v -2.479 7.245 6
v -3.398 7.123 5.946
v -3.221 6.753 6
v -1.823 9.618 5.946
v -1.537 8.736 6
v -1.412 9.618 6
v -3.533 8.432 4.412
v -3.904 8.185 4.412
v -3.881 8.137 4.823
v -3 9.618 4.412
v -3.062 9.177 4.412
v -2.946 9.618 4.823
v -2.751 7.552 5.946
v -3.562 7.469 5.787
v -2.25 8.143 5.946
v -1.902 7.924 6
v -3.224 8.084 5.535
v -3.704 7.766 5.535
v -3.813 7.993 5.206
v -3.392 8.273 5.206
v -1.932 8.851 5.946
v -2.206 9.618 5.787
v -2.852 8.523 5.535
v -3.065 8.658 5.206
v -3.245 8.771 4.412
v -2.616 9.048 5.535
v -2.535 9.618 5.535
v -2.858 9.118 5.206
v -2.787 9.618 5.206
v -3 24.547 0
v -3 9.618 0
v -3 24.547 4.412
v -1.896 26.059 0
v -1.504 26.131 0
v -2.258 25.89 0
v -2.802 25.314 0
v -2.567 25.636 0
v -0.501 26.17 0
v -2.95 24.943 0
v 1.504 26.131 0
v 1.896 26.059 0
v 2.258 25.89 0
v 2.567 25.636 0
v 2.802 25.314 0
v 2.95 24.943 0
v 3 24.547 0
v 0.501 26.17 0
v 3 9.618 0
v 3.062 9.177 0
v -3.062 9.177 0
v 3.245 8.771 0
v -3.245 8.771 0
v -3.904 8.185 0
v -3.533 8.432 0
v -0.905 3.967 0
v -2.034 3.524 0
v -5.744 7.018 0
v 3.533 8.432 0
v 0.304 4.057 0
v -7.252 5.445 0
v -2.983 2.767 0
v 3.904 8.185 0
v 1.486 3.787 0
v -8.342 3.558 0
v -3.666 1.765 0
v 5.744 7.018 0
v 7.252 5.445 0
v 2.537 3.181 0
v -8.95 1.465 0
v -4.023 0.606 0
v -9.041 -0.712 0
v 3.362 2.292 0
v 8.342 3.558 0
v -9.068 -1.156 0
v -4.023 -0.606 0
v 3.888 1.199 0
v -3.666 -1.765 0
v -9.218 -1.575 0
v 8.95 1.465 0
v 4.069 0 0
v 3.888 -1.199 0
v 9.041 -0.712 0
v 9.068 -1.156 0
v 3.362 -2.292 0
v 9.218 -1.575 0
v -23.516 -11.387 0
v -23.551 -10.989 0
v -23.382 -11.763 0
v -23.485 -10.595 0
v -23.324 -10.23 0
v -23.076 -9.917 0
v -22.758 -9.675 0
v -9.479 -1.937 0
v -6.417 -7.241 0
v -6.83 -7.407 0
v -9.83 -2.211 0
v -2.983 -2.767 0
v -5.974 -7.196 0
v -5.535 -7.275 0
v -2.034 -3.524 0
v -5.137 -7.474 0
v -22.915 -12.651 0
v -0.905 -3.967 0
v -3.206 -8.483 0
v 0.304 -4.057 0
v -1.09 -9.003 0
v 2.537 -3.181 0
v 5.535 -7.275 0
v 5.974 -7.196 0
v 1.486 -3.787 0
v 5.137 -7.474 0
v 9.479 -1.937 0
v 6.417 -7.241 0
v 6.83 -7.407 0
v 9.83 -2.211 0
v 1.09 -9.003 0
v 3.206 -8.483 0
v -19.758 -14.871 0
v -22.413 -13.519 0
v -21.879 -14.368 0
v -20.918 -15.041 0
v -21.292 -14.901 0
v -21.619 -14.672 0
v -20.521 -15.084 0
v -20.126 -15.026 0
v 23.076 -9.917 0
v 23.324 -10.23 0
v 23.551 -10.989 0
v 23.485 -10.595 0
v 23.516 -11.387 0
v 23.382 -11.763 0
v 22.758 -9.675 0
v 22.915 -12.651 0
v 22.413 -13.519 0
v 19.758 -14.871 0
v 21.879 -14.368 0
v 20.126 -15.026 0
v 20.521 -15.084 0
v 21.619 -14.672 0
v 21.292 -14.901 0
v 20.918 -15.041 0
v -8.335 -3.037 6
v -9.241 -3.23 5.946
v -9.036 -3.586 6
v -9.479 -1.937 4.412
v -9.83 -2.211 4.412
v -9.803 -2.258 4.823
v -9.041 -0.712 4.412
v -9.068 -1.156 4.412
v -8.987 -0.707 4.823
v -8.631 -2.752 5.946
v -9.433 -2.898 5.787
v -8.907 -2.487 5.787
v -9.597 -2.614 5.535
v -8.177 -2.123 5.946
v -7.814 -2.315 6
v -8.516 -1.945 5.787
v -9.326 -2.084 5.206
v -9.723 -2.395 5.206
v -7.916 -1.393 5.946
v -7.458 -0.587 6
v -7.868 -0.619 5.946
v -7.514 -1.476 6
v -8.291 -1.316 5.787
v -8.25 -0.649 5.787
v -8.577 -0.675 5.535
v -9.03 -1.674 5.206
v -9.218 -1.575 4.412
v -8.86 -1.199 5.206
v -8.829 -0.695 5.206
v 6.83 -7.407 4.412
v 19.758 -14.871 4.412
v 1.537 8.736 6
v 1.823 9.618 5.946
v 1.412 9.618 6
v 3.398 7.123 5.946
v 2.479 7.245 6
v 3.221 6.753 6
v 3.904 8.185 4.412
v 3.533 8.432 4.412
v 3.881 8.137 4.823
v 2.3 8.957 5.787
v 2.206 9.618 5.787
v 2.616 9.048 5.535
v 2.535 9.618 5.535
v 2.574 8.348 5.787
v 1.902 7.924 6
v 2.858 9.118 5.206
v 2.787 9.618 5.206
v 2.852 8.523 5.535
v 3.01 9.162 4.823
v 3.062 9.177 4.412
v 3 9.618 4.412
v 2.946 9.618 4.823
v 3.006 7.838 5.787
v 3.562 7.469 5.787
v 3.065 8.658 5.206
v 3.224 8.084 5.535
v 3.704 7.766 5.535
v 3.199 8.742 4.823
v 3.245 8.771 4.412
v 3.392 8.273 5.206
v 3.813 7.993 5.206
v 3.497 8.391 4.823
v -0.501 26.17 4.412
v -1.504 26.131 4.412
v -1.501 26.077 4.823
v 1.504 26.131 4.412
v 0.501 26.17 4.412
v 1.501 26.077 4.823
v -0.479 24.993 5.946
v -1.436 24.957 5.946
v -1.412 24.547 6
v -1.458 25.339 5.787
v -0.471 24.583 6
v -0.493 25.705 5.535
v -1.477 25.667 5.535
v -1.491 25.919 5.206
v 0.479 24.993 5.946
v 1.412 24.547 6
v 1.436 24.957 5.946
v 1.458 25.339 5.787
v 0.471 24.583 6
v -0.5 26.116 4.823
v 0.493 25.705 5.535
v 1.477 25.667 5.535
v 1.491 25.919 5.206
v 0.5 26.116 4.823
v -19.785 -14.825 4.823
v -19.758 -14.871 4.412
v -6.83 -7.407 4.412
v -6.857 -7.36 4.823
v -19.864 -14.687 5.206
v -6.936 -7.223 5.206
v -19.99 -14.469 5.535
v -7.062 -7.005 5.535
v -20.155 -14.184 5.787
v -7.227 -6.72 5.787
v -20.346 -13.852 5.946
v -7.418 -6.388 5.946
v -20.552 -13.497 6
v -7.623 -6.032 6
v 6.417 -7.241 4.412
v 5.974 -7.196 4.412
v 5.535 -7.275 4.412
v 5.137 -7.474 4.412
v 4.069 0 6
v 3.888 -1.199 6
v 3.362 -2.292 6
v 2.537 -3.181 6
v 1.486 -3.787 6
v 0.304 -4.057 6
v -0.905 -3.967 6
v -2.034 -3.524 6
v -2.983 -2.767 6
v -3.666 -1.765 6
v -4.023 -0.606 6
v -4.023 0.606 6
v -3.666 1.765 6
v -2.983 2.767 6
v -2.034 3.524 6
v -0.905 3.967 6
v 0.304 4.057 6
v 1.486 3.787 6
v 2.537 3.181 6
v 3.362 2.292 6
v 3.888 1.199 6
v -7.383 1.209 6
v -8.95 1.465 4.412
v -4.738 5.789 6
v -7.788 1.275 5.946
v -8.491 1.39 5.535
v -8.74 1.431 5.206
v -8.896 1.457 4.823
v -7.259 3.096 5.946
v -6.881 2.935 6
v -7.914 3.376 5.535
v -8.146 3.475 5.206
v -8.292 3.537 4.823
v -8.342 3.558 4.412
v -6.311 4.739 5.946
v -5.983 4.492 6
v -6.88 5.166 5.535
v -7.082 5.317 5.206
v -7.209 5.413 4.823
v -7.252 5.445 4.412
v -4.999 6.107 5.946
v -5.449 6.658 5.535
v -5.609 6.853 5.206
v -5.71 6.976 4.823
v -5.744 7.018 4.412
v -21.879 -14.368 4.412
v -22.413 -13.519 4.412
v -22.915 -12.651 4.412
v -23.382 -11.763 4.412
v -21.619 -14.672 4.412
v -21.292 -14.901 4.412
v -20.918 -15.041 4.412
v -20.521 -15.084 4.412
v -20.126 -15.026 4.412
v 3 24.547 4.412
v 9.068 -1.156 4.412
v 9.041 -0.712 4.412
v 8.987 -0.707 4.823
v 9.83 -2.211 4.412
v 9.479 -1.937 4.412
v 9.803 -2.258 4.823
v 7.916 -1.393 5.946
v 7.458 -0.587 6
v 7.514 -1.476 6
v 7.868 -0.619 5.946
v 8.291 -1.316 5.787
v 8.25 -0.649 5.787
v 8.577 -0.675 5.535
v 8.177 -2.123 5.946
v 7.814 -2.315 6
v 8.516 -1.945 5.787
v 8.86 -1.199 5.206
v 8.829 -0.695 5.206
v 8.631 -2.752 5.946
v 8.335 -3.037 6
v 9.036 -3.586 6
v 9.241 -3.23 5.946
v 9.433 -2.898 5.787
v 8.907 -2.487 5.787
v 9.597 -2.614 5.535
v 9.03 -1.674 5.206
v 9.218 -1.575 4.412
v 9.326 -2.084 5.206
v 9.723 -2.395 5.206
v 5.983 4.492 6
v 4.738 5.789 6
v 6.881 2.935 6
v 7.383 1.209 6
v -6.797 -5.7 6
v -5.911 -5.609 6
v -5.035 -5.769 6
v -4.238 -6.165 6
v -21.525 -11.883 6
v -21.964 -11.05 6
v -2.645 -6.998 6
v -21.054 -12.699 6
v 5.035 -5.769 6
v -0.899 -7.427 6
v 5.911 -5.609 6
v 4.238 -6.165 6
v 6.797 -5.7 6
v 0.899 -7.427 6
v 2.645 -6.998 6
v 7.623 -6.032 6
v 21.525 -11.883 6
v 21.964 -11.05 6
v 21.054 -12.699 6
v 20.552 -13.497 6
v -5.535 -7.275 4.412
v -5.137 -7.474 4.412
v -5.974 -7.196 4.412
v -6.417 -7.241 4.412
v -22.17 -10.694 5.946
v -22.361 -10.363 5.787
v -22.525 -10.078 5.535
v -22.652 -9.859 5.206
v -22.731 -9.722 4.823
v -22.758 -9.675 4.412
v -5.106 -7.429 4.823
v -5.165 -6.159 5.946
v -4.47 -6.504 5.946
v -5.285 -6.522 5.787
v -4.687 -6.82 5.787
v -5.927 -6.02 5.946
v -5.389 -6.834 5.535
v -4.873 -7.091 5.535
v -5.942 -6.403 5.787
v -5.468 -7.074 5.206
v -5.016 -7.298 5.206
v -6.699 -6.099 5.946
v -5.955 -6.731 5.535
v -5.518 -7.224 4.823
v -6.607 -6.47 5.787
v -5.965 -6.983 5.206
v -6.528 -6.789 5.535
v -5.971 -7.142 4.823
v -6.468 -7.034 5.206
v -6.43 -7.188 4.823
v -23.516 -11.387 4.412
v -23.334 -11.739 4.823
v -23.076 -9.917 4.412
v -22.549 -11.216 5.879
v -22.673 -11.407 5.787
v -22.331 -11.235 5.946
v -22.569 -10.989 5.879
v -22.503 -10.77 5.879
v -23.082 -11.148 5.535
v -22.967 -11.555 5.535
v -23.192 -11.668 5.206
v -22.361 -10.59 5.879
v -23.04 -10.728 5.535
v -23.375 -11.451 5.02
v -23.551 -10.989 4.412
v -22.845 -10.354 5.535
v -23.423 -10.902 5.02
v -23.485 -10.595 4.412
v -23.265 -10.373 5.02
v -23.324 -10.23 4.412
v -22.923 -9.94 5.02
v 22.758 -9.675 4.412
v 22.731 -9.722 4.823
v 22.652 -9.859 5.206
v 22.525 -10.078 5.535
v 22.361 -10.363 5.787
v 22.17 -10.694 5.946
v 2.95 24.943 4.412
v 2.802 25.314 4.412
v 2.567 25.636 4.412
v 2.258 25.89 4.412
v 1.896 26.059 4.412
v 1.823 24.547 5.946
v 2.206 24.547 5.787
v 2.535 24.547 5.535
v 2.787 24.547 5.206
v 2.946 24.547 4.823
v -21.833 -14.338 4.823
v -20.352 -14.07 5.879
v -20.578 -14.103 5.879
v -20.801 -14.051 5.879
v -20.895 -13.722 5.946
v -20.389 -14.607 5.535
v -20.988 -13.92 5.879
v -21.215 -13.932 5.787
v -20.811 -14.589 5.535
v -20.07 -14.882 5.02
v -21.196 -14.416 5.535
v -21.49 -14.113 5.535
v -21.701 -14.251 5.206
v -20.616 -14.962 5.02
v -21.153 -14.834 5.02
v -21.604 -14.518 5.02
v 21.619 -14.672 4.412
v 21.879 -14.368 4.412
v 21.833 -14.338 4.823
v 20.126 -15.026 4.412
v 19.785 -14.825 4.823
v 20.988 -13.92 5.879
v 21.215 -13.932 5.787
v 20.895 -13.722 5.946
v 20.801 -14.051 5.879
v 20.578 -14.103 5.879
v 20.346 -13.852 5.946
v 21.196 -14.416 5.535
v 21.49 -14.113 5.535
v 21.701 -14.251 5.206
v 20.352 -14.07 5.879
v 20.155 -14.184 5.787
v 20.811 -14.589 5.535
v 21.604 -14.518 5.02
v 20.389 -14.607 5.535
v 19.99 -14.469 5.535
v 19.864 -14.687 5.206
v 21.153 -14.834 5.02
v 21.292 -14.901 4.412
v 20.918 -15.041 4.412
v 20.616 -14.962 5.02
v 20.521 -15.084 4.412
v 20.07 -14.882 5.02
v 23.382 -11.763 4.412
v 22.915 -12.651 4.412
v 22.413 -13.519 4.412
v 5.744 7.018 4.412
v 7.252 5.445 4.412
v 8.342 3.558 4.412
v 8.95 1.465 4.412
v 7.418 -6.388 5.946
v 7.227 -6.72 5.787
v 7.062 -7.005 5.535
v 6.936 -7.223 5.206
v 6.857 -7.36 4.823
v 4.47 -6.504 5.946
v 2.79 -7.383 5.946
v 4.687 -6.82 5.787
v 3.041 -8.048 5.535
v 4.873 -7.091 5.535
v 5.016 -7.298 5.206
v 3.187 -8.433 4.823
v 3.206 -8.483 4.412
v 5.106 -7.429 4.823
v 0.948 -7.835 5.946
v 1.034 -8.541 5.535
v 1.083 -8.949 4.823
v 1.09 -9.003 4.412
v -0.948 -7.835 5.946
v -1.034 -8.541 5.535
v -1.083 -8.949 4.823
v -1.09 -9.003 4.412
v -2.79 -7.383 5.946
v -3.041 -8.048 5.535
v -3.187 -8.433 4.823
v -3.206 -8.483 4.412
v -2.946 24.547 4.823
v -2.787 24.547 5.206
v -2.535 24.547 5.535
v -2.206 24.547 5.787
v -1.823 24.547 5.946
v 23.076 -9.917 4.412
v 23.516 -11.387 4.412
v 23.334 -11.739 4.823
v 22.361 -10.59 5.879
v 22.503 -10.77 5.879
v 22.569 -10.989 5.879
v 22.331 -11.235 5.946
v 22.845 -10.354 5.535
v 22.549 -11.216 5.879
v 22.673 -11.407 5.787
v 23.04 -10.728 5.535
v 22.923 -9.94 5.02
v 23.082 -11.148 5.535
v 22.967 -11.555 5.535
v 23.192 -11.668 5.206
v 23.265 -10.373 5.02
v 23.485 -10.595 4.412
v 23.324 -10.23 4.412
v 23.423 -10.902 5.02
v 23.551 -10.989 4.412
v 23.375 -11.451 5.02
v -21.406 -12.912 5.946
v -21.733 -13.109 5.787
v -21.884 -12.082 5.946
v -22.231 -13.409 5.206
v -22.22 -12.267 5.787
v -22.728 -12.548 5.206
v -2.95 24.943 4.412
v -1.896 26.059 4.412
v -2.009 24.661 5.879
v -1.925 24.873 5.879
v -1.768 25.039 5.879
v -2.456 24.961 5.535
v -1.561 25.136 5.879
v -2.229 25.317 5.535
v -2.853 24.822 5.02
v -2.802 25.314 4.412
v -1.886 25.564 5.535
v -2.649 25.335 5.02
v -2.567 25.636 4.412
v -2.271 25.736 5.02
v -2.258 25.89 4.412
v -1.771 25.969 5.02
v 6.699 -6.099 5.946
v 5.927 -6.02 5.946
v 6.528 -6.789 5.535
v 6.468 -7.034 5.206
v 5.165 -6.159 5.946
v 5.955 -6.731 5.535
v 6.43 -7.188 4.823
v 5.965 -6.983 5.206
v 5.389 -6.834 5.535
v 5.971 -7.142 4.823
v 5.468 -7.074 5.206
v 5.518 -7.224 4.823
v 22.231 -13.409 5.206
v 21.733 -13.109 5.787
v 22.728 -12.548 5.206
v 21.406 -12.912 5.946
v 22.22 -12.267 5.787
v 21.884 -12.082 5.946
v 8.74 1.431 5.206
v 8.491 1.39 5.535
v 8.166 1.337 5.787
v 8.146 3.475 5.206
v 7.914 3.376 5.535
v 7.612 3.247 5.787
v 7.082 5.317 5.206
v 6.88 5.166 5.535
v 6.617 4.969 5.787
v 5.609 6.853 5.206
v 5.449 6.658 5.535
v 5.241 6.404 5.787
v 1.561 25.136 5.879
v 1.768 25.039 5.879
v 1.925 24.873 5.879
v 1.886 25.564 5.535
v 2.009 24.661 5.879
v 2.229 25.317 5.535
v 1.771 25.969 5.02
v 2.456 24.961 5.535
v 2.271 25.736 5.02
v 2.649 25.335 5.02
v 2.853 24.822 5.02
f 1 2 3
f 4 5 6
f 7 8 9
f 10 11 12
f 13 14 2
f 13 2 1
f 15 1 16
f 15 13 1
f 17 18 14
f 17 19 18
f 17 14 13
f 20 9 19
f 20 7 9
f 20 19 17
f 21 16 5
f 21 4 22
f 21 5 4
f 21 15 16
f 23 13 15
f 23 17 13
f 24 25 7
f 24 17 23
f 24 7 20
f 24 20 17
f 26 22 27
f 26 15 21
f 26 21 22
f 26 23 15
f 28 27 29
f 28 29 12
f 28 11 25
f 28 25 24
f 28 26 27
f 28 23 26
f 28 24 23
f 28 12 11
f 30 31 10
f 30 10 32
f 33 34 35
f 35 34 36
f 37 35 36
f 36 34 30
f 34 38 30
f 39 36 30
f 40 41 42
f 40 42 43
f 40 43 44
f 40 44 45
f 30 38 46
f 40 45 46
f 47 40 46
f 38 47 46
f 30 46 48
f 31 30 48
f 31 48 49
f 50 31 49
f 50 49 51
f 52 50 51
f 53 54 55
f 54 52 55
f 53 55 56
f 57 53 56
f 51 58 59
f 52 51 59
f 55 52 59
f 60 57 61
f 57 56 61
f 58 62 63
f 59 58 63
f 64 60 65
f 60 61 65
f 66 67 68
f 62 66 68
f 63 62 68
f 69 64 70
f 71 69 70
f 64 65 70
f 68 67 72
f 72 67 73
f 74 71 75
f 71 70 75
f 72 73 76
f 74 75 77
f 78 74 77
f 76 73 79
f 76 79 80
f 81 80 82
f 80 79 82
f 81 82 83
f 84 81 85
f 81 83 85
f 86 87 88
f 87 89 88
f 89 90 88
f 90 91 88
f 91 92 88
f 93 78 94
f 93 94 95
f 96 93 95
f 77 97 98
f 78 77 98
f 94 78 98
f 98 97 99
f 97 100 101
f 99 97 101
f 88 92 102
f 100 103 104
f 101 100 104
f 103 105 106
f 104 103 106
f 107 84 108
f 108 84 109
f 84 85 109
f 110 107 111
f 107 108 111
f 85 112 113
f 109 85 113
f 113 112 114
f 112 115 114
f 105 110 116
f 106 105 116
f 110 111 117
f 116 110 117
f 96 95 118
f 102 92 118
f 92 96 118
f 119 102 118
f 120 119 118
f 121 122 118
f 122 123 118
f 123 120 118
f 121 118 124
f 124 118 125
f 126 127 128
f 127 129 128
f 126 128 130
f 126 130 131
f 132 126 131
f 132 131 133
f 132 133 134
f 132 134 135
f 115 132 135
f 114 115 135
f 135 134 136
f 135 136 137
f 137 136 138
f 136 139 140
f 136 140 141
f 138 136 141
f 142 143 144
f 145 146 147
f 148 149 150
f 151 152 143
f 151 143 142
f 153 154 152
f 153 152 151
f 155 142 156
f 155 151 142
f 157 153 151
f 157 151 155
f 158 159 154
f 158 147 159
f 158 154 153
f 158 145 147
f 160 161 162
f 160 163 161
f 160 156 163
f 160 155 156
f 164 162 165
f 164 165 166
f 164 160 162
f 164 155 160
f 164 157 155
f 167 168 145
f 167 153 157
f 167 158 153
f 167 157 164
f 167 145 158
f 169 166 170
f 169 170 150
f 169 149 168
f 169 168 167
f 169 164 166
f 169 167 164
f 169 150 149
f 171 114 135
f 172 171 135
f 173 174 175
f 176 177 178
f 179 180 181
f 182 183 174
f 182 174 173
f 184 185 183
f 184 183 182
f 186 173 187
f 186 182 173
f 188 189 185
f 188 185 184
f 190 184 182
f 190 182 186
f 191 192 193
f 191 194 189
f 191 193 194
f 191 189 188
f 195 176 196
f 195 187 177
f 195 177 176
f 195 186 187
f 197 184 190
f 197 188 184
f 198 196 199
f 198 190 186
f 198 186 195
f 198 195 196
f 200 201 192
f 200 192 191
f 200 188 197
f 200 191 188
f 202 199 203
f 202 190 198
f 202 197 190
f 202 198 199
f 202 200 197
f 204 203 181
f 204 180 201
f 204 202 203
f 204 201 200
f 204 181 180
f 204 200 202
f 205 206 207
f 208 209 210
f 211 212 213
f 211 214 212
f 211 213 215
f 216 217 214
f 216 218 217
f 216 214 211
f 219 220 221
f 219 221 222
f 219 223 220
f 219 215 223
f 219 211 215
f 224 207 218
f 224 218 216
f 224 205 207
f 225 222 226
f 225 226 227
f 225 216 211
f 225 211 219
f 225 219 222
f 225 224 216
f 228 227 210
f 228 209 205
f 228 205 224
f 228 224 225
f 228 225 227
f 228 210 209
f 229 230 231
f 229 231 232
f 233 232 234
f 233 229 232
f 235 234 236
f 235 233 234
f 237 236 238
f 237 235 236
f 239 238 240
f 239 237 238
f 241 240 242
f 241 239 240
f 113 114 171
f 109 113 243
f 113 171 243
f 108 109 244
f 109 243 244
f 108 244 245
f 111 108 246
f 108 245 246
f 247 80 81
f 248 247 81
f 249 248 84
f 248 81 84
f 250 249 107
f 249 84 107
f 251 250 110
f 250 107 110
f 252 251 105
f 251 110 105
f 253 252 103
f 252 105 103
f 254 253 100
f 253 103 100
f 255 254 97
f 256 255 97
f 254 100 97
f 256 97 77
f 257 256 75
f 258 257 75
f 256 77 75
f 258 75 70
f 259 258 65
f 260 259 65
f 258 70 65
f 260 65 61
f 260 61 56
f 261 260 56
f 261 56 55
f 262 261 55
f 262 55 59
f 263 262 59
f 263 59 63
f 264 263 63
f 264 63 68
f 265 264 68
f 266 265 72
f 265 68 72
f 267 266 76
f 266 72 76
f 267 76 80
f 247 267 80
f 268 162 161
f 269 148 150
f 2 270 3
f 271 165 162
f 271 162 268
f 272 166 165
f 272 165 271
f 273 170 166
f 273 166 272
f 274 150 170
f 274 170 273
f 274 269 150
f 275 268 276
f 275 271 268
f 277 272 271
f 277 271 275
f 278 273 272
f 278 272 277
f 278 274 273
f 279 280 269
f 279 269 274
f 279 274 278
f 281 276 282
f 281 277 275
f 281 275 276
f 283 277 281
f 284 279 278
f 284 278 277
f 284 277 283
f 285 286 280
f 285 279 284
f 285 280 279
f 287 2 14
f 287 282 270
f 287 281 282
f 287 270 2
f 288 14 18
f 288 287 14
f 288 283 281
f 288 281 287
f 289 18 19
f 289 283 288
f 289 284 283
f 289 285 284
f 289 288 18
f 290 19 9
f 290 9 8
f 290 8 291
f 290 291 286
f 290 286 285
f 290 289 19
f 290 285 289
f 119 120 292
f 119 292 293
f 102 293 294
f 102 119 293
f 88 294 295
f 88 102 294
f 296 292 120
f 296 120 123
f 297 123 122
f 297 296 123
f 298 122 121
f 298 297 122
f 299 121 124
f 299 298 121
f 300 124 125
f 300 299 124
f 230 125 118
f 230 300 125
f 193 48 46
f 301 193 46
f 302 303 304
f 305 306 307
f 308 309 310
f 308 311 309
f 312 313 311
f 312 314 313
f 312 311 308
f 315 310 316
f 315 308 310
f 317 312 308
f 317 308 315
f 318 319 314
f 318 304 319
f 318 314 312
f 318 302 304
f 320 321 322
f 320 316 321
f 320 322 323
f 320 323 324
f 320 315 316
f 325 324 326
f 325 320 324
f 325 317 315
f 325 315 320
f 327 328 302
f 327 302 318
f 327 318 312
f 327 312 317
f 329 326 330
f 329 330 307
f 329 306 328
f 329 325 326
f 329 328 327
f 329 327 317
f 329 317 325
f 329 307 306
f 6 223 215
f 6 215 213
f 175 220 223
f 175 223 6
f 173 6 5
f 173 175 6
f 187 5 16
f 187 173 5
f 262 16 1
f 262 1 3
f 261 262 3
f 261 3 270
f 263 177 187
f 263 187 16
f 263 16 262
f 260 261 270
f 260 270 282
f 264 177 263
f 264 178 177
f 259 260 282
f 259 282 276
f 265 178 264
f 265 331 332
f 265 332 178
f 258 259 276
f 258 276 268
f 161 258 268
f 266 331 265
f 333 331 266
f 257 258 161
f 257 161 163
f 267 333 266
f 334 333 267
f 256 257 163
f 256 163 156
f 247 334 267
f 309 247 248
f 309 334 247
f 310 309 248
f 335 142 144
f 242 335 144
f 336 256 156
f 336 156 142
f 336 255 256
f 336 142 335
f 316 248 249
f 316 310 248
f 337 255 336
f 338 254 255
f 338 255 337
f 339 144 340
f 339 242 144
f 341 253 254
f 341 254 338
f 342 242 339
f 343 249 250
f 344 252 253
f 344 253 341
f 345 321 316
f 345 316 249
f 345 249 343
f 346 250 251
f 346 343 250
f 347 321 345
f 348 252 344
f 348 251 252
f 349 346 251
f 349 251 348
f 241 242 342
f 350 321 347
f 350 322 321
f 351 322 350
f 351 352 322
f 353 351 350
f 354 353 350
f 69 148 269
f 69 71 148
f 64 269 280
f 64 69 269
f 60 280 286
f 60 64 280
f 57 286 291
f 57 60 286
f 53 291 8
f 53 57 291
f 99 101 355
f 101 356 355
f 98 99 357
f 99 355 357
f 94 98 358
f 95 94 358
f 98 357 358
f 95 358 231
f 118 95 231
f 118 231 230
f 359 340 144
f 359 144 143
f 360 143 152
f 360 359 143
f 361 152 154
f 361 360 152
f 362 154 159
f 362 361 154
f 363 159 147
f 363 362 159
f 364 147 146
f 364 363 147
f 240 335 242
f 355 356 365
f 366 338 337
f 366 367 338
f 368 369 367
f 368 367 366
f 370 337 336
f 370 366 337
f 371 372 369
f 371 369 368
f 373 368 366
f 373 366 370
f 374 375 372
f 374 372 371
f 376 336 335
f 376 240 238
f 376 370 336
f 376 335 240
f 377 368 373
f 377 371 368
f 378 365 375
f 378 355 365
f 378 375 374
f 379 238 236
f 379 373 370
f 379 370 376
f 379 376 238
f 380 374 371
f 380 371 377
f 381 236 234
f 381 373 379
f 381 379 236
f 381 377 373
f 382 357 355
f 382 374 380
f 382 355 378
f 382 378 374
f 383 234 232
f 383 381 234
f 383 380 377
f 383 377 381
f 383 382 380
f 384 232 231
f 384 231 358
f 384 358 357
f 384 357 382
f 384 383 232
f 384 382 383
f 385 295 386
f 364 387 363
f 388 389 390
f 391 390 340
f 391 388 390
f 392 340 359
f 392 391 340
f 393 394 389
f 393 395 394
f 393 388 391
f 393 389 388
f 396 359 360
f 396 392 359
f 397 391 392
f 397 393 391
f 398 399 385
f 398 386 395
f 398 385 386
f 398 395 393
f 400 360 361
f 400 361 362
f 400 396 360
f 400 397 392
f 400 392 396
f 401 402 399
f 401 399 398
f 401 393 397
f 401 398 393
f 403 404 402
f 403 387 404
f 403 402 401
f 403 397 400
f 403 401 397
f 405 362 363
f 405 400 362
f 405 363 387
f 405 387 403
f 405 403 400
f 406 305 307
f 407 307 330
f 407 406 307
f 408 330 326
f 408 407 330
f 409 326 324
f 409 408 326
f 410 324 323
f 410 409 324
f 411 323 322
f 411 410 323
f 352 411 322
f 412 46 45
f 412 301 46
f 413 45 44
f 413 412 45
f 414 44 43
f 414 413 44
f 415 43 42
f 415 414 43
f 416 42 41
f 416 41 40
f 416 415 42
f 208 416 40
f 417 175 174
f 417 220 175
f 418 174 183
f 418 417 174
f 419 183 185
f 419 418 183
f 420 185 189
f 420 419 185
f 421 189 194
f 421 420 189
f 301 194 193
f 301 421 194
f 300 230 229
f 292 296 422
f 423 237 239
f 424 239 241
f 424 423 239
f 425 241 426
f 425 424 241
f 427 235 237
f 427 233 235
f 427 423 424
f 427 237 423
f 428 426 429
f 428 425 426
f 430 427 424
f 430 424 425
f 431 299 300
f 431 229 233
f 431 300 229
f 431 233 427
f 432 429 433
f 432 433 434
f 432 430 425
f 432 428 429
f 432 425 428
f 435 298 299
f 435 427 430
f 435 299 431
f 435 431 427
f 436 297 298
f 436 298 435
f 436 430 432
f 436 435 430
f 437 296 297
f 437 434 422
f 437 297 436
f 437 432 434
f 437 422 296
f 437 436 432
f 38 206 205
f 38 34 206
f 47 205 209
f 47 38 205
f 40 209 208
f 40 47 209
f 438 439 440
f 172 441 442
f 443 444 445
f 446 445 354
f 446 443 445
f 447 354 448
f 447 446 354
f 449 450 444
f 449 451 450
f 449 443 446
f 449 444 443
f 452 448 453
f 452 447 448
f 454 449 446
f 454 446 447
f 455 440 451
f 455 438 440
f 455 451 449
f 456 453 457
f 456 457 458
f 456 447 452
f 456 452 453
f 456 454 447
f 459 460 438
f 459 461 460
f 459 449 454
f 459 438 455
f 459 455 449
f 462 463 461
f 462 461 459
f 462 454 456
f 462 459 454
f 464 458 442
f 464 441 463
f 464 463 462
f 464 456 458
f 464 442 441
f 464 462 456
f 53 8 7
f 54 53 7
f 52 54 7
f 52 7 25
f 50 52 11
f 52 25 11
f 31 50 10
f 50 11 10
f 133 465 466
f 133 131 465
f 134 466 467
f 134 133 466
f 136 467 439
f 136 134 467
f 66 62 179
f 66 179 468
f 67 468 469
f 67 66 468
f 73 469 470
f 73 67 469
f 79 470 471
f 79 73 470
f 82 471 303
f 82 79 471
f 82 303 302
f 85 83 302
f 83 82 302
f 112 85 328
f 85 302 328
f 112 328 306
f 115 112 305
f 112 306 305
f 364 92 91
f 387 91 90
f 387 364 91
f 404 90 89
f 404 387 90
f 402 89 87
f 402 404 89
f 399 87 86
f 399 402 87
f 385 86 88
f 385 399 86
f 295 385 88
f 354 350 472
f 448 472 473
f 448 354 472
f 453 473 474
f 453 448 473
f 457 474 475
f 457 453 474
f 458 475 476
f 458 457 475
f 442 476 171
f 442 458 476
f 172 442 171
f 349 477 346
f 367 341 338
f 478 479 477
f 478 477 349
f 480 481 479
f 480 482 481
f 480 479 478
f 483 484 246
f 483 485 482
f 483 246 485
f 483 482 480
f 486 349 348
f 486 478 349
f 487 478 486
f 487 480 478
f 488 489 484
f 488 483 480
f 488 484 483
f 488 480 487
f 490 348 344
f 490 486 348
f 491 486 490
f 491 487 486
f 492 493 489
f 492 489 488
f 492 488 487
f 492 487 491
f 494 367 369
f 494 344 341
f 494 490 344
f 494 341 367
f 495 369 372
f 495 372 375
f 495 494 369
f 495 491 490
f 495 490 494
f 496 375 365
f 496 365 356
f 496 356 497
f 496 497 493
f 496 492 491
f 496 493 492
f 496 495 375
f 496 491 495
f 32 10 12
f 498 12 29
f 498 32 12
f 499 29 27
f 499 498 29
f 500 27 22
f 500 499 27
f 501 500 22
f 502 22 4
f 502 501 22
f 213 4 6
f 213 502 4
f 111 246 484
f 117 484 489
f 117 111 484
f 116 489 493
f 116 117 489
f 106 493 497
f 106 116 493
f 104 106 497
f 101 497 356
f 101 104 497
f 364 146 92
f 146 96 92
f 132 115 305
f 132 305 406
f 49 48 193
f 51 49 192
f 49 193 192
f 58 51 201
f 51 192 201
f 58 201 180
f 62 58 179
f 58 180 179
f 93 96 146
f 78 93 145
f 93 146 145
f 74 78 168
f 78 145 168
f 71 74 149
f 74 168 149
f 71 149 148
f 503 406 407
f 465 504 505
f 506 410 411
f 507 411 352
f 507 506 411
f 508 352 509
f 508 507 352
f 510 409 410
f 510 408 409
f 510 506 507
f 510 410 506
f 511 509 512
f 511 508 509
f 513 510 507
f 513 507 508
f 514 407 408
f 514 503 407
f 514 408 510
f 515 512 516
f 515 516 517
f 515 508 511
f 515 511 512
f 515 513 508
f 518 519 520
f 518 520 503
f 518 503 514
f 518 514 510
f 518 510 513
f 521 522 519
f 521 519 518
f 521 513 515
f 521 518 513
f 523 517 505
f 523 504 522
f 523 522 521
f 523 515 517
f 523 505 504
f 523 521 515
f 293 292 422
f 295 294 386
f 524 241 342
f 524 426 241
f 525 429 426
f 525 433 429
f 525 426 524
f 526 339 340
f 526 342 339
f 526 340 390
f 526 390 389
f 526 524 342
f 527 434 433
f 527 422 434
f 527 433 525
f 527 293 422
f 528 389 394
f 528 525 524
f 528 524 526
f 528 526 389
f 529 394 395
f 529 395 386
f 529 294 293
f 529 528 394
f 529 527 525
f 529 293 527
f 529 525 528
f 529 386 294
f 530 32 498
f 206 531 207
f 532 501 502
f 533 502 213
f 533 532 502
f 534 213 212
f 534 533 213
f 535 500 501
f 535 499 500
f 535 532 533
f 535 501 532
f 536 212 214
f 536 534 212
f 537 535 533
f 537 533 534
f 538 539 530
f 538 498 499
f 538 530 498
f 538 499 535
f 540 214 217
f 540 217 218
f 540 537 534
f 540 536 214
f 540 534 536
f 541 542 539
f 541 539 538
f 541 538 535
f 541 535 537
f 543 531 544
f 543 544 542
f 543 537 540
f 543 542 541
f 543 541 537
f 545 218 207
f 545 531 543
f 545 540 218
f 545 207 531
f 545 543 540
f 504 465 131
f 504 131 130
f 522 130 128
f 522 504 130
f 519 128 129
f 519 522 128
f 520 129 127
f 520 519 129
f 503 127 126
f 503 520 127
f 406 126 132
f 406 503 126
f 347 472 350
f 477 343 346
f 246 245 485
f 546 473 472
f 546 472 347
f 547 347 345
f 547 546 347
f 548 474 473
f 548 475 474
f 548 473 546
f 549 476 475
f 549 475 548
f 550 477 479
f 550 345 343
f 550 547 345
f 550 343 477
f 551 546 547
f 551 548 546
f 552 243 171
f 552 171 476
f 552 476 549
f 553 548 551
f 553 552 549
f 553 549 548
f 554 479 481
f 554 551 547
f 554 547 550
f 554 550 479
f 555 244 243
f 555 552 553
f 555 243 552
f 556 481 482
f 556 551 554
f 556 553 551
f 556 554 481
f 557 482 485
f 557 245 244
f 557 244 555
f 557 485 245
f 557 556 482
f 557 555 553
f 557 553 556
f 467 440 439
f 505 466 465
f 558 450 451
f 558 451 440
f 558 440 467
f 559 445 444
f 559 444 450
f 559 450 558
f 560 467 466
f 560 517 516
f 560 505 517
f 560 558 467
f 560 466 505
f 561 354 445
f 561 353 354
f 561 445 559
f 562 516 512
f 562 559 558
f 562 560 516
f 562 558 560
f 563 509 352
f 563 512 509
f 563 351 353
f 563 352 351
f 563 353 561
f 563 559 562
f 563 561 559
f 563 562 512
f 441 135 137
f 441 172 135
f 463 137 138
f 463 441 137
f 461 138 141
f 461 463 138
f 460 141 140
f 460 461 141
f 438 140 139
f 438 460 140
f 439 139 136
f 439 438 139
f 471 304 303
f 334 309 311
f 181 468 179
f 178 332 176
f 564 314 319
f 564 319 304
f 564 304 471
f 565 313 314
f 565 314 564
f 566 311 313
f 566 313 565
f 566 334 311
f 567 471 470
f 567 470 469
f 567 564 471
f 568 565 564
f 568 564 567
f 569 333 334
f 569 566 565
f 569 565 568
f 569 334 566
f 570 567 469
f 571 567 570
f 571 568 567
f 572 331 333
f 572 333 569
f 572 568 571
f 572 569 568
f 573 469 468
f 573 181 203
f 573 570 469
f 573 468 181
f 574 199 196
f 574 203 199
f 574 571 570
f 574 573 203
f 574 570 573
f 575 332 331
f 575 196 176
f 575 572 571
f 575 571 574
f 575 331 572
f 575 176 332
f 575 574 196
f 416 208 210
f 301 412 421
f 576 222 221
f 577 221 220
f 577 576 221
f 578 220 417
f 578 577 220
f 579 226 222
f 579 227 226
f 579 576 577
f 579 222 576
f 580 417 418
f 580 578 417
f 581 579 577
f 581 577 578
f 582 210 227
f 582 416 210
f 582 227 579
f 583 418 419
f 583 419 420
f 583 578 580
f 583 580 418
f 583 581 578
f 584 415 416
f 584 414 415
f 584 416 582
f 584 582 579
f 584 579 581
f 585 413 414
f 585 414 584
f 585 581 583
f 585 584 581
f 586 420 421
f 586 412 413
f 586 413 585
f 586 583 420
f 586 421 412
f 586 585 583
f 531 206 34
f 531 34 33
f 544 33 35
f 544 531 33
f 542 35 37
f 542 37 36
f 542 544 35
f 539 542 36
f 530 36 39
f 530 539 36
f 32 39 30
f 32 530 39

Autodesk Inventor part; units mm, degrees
ref_plane "YZ Plane" through (0, 0, 0) normal (1, 0, 0) x (0, 1, 0)
ref_plane "XZ Plane" through (0, 0, 0) normal (0, 1, 0) x (-1, 0, 0)
ref_plane "XY Plane" through (0, 0, 0) normal (0, 0, 1) x (1, 0, 0)
sketch "Sketch1" plane through (0, 0, 0) normal (0, 0, 1) x (1, 0, 0)
  circle A0 centre (0, 0) radius 4.0687
  arc A1 (-3, 8.5582) -> (3, 8.5582) centre (0, 0) ccw
  arc A2 (3, 26.0022) -> (-3, 26.0022) centre (0, 0) ccw
  line L0 (-3, 8.5582) -> (-3, 26.0022)
  line L1 (3, 8.5582) -> (3, 26.0022)
  dimension "d0" = 26.1747
  dimension "d2" = 6
  dimension "d3" = 5
  dimension "d4" = 8.1375
extrude "Extrusion1" add sketch "Sketch1" along normal blind 6
pattern_circular "Circular Pattern1" count 3 over 360 about axis through (0, 0, 0) along (0, 0, 1) of "Extrusion1"
fillet "Fillet1" radius 1.5875 24 edges at (-5.9116, -6.8772, 3) (5.9116, -6.8772, 3) (8.9116, -1.681, 3) (3, 8.5582, 3) (-3, 8.5582, 3) (-8.9116, -1.681, 3) (-21.0186, -15.5992, 3) (-24.0186, -10.403, 3) (-3, 26.0022, 3) (3, 26.0022, 3) (21.0186, -15.5992, 3) (24.0186, -10.403, 3) (-22.668, -13.0874, 6) (0, 26.1747, 6) (22.668, -13.0874, 6) (-13.4651, -11.2382, 6) (0, -9.0687, 6) (13.4651, -11.2382, 6) (16.4651, -6.042, 6) (7.8538, 4.5344, 6) (3, 17.2802, 6) (-3, 17.2802, 6) (-7.8538, 4.5344, 6) (-16.4651, -6.042, 6)
properties part number "ALLIGNER"
